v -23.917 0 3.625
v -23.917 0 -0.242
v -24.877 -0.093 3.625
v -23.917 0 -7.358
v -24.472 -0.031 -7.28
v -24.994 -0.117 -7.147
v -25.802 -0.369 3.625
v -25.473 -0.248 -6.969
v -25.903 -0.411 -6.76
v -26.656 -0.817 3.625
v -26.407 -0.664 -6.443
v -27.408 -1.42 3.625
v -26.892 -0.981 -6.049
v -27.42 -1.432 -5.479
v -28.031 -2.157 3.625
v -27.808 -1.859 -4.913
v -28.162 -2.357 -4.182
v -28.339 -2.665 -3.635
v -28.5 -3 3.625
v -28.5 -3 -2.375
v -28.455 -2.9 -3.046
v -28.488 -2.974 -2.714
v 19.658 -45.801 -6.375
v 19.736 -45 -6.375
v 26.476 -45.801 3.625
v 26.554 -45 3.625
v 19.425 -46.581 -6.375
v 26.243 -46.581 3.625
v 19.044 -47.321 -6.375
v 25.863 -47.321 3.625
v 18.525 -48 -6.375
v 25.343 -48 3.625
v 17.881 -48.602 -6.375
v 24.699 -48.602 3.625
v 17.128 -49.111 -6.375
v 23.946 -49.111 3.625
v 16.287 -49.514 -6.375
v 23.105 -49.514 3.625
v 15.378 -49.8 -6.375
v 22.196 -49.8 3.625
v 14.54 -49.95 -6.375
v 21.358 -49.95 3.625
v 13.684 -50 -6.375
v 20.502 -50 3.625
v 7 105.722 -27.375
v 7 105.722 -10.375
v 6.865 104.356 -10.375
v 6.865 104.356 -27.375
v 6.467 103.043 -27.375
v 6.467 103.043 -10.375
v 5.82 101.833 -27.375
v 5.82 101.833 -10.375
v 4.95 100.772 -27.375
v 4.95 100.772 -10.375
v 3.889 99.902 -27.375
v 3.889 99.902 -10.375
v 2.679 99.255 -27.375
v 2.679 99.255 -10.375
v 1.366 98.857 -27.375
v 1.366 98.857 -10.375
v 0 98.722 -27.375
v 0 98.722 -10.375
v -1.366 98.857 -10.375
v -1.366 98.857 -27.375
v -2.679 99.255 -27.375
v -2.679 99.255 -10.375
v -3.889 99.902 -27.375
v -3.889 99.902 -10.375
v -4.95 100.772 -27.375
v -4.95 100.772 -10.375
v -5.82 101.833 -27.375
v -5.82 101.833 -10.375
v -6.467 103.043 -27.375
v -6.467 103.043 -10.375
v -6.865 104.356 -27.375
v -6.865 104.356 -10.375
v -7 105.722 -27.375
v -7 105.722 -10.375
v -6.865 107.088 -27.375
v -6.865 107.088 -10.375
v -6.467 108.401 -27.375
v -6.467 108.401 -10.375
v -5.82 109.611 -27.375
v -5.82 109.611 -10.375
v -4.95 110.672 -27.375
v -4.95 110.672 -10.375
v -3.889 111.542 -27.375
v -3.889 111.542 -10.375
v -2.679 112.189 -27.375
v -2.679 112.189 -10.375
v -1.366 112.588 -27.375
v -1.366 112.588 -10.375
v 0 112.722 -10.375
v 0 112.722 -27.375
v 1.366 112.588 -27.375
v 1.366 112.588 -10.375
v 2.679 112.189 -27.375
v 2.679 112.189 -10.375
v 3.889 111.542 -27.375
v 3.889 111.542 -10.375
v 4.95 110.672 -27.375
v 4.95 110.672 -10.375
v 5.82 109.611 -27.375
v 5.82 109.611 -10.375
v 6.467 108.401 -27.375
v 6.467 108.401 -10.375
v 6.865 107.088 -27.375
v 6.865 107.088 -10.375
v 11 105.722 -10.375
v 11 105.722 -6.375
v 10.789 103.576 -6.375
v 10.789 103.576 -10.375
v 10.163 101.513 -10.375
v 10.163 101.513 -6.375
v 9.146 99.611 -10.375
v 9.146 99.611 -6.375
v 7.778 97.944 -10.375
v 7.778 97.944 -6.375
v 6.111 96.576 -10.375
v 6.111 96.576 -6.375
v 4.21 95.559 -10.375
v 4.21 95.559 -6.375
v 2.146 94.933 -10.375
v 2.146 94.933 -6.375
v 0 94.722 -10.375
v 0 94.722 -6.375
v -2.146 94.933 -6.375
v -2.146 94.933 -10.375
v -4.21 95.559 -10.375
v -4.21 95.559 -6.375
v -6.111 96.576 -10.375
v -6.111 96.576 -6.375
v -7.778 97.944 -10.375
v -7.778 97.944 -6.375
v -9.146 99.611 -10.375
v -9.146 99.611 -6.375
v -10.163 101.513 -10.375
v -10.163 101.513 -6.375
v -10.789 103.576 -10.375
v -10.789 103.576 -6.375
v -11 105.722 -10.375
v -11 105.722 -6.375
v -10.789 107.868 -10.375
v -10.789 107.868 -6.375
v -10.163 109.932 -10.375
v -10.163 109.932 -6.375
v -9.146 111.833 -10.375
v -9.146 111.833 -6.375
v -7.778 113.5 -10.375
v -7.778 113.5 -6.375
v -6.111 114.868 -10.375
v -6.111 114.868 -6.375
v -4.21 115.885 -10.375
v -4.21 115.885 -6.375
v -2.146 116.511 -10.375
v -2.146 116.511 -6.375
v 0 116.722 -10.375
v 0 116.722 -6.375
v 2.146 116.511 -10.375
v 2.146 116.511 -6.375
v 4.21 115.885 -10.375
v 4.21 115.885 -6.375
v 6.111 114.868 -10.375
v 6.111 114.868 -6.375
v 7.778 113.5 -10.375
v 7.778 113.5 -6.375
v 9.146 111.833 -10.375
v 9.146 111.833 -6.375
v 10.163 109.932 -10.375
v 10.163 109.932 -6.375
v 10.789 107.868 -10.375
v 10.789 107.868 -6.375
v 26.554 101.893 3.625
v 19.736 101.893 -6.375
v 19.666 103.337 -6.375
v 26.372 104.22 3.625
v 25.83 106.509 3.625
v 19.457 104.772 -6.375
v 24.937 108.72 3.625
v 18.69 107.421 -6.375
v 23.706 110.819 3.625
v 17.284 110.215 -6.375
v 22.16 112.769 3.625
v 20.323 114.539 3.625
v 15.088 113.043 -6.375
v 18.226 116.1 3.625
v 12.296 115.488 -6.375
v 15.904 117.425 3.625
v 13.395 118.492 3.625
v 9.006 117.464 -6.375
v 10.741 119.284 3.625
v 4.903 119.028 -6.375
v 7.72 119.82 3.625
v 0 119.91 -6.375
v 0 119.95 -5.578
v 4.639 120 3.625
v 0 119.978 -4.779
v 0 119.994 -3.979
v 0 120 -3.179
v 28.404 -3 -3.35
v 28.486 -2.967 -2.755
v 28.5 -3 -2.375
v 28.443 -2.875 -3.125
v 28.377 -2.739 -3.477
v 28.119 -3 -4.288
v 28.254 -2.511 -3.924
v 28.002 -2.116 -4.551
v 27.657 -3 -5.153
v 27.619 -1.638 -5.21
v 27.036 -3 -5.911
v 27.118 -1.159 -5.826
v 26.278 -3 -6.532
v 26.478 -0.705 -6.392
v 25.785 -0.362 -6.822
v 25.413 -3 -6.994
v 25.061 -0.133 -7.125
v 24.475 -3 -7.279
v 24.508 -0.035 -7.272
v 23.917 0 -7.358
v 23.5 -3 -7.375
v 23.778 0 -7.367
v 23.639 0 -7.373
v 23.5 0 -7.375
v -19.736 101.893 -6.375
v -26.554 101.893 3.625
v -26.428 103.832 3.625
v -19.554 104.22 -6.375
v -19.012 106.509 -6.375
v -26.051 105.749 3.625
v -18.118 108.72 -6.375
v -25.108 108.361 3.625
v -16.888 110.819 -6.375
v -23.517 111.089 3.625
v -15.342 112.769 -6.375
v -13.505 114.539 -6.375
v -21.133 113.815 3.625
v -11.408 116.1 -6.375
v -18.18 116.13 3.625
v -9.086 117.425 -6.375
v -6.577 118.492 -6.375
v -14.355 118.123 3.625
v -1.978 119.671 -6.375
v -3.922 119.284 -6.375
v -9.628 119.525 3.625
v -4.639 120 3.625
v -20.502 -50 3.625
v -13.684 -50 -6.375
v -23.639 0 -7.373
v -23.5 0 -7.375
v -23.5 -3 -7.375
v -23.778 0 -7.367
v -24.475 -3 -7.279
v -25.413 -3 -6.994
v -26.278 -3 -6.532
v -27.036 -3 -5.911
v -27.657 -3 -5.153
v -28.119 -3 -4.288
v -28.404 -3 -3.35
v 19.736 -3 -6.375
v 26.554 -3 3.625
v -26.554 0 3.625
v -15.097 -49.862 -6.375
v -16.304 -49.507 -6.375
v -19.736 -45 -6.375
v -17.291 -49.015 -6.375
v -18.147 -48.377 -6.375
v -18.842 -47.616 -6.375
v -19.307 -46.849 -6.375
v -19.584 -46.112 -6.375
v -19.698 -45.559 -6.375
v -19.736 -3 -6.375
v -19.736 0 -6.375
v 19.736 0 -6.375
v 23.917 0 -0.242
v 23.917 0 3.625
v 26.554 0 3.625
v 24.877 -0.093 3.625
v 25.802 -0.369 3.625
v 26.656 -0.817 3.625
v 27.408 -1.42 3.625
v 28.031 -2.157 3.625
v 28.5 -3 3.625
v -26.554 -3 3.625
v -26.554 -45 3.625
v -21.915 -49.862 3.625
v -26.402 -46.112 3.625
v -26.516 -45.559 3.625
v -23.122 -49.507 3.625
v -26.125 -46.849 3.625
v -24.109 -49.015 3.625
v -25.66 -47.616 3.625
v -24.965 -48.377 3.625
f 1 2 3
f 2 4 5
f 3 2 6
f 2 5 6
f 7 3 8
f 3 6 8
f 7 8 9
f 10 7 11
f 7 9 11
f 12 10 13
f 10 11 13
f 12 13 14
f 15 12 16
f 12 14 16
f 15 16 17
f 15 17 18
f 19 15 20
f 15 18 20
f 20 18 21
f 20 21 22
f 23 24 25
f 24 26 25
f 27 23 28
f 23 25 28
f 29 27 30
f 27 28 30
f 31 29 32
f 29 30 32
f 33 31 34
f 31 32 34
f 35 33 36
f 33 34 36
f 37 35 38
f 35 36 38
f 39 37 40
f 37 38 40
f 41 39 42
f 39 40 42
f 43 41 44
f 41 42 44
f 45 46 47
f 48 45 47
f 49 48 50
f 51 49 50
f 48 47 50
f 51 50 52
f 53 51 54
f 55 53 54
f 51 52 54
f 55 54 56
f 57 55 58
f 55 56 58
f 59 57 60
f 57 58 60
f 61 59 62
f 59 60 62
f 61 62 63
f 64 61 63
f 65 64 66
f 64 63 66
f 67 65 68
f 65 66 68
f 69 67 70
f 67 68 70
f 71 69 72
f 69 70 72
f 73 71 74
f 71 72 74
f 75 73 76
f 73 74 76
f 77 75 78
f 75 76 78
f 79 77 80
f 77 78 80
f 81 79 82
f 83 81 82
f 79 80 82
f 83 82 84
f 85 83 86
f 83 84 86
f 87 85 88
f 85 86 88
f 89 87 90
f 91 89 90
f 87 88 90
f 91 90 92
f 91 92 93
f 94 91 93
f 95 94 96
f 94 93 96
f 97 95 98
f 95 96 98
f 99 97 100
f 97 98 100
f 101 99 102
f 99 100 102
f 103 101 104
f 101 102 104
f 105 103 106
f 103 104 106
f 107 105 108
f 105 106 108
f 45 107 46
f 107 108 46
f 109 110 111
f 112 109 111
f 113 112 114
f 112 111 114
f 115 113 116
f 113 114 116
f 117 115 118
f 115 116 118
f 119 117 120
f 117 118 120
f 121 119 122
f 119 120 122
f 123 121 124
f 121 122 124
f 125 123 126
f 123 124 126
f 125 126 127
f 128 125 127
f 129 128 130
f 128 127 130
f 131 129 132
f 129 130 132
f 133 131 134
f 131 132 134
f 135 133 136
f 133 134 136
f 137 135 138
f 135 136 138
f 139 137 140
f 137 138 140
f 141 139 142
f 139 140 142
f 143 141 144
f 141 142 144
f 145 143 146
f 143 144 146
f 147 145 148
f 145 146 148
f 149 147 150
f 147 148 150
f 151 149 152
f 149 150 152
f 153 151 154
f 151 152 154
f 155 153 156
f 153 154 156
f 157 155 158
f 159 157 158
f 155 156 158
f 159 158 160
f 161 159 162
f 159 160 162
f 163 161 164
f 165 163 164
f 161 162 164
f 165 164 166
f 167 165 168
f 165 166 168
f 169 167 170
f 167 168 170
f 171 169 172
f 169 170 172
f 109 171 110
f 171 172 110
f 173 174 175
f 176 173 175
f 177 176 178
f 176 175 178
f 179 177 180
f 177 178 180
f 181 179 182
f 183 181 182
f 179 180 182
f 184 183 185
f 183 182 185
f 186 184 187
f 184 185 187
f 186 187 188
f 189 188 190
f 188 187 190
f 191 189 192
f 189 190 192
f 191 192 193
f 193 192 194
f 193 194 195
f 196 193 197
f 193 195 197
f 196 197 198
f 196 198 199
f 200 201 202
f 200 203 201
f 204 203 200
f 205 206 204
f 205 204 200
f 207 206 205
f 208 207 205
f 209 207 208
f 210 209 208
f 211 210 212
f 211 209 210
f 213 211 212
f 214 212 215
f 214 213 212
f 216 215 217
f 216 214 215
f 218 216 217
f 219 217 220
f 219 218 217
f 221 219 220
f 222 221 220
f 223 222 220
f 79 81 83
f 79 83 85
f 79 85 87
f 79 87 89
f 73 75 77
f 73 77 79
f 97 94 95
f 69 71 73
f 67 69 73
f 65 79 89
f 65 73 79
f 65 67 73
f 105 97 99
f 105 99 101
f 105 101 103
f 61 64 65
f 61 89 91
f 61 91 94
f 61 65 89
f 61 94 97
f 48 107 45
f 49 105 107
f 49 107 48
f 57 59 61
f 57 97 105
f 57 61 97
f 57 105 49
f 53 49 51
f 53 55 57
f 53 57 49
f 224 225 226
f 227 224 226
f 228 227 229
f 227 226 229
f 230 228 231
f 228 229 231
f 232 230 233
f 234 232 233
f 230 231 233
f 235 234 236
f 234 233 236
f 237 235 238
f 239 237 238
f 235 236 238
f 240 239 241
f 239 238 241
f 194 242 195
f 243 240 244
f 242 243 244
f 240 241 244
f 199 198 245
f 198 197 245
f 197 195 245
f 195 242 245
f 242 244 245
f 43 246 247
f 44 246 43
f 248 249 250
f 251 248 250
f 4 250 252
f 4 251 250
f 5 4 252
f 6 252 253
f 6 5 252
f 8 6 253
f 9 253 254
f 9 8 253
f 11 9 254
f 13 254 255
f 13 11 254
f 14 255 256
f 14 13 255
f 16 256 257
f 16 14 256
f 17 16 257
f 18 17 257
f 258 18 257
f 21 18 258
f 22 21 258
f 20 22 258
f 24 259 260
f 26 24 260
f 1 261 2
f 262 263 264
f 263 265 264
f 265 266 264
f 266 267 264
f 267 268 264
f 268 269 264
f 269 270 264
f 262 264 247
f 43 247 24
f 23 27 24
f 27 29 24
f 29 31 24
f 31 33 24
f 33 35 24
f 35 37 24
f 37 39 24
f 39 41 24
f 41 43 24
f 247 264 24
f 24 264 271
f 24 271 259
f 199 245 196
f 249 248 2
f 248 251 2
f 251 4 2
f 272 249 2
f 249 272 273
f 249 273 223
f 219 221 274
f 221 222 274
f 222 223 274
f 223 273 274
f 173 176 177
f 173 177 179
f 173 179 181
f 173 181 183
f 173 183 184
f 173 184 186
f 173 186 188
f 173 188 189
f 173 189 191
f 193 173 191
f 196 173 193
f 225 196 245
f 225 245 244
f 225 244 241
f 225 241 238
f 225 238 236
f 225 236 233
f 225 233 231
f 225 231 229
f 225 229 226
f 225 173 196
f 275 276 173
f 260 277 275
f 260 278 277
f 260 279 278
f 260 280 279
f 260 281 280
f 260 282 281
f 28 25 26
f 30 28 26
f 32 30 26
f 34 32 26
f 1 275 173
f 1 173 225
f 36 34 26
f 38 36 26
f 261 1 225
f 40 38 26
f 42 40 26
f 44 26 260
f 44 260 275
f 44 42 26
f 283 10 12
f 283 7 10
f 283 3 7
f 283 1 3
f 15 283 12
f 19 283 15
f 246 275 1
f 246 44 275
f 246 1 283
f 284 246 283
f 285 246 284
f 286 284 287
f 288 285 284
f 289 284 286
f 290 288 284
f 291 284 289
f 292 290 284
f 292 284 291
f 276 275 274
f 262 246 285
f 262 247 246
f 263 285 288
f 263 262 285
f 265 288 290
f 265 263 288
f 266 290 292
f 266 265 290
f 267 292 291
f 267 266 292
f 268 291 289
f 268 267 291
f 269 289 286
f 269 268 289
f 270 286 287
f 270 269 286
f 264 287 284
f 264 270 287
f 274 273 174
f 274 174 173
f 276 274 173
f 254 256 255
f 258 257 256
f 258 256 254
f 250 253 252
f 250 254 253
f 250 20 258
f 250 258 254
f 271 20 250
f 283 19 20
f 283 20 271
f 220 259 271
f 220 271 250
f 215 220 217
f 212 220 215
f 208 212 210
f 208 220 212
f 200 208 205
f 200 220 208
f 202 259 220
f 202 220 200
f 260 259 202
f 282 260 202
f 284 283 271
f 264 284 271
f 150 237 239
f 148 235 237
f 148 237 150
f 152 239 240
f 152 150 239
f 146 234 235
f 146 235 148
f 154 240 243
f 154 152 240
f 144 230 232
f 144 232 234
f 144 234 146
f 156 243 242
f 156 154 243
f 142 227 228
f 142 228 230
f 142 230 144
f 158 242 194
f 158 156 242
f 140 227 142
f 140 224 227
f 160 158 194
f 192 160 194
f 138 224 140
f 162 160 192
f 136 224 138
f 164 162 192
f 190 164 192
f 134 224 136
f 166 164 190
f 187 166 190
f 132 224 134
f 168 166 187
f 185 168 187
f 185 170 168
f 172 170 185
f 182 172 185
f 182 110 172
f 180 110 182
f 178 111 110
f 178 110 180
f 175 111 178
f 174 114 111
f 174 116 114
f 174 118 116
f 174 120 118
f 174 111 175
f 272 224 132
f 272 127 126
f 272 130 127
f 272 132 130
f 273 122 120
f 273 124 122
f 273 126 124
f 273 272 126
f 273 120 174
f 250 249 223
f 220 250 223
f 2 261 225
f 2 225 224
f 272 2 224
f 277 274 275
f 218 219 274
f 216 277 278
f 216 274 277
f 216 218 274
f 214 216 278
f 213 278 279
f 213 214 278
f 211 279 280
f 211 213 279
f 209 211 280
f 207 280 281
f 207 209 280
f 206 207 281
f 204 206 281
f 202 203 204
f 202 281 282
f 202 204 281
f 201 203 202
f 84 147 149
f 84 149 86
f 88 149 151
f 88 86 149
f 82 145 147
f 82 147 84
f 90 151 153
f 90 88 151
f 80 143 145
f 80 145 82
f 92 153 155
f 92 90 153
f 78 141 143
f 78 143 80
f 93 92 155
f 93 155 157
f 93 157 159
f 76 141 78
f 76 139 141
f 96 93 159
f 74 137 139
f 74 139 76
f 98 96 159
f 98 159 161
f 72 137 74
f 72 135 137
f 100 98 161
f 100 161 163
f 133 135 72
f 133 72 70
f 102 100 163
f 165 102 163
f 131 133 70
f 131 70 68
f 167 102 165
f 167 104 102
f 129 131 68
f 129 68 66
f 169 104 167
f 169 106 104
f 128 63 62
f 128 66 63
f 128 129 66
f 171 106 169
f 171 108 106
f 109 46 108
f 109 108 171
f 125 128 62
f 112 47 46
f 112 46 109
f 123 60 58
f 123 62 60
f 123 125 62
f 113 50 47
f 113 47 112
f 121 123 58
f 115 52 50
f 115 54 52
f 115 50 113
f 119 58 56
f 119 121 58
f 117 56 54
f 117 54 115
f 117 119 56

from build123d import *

# Parameters (mm, degrees)
F1_DEPTH    = 50
F2_DEPTH    = 3
F3_T1_DEPTH = 28
F3_T3_DEPTH = 33.9128784748
F4_DEPTH    = 120
F5_T1_DEPTH = 102.6362149123
F5_T3_DEPTH = 102.6362149123
F6_R        = 11
F7_DEPTH    = 4
F8_R        = 7
F9_DEPTH    = 17
F10_R       = 5


# Not quite as in the source:
# - a fillet or chamfer that OpenCascade refuses, or shapes differently, is made with other operations: its cross-section is extruded or revolved along the edge and cut away or added


with BuildPart() as f1:
    # F0 (on Front) → F1 (new body)
    with BuildSketch(Plane.XZ):
        Polygon((26.5539305929, 3.625), (-26.5539305929, 3.625), (-19.7357487747, -6.375), (19.7357487747, -6.375), align=None)
    extrude(amount=F1_DEPTH)

    # F0 (on Front) → F2 (join)
    with BuildSketch(Plane.XZ):
        Polygon((20, -6.875), (-20, -6.875), (-27.1590909091, 3.625), (-27.5, 3.625), (-28.5, 3.625), (-28.5, -7.375), (28.5, -7.375), (28.5, 3.625), (27.5, 3.625), (27.1590909091, 3.625), align=None)
        Polygon((26.5539305929, 3.625), (-26.5539305929, 3.625), (-19.7357487747, -6.375), (19.7357487747, -6.375), align=None)
        Polygon((-27.1590909091, 3.625), (-20, -6.875), (20, -6.875), (27.1590909091, 3.625), (26.5539305929, 3.625), (19.7357487747, -6.375), (-19.7357487747, -6.375), (-26.5539305929, 3.625), align=None)
    extrude(amount=F2_DEPTH)

    # F3: fillet of radius 5 on 4 edges, made by hand

    # F3_s2 → F3_t1 (cut)
    with BuildSketch(Plane.XZ.offset(-12.5)):
        with BuildLine():
            ThreePointArc((28.5, -2.375), (27.0355339059, -5.9105339059), (23.5, -7.375))
            Line((23.5, -7.375), (28.5, -7.375))
            Line((28.5, -7.375), (28.5, -2.375))
        make_face()
        with BuildLine():
            ThreePointArc((-23.5, -7.375), (-27.0355339059, -5.9105339059), (-28.5, -2.375))
            Line((-28.5, -2.375), (-28.5, -7.375))
            Line((-28.5, -7.375), (-23.5, -7.375))
        make_face()
    extrude(amount=F3_T1_DEPTH, mode=Mode.SUBTRACT)

    # F3_s4 → F3_t3 (cut)
    with BuildSketch(Plane.XY.offset(-18.8314392374)):
        with BuildLine():
            ThreePointArc((23.917424305, 0), (26.6560370926, -0.8166998673), (28.5, -3))
            Line((28.5, -3), (28.5, 0))
            Line((28.5, 0), (23.917424305, 0))
        make_face()
        with BuildLine():
            ThreePointArc((-23.917424305, 0), (-26.6560370926, -0.8166998673), (-28.5, -3))
            Line((-28.5, -3), (-28.5, 0))
            Line((-28.5, 0), (-23.917424305, 0))
        make_face()
    extrude(amount=F3_T3_DEPTH, mode=Mode.SUBTRACT)

    # F0 (on Front) → F4 (join)
    with BuildSketch(Plane.XZ):
        Polygon((26.5539305929, 3.625), (-26.5539305929, 3.625), (-19.7357487747, -6.375), (19.7357487747, -6.375), align=None)
    extrude(amount=-F4_DEPTH)

    # F5: fillet of radius 18.1066017178 on 2 edges, made by hand

    # F5_s2 → F5_t1 (cut)
    with BuildSketch(Plane(origin=(-22.2043882639, 0, -32.5664361204), x_dir=(0, 1, 0), z_dir=(0.5633368246, 0, 0.8262273428))):
        with BuildLine():
            ThreePointArc((101.8933982822, -19.8974875256), (114.6966991411, -14.5941866667), (120, -1.7908858078))
            Line((120, -1.7908858078), (120, -19.8974875256))
            Line((120, -19.8974875256), (101.8933982822, -19.8974875256))
        make_face()
    extrude(amount=F5_T1_DEPTH, mode=Mode.SUBTRACT)

    # F5_s4 → F5_t3 (cut)
    with BuildSketch(Plane(origin=(-35.614371138, 0, 52.2344110024), x_dir=(0, 1, 0), z_dir=(0.5633368246, 0, -0.8262273428))):
        with BuildLine():
            ThreePointArc((101.8933982822, -19.8974875256), (114.6966991411, -14.5941866667), (120, -1.7908858078))
            Line((120, -1.7908858078), (120, -19.8974875256))
            Line((120, -19.8974875256), (101.8933982822, -19.8974875256))
        make_face()
    extrude(amount=F5_T3_DEPTH, mode=Mode.SUBTRACT)

    # F6 (on face) → F7 (join)
    with BuildSketch(Plane(origin=(0, 0, -6.375), x_dir=(1, 0, 0), z_dir=(0, 0, -1))):
        with Locations((0, -105.7220622897)):
            Circle(F6_R)
    extrude(amount=F7_DEPTH)

    # F8 (on face) → F9 (join)
    with BuildSketch(Plane(origin=(0, 0, -10.375), x_dir=(1, 0, 0), z_dir=(0, 0, -1))):
        with Locations((0, -105.7220622897)):
            Circle(F8_R)
    extrude(amount=F9_DEPTH)

    # F10
    f10_edges = [f1.edges().sort_by_distance(p)[0] for p in [
        (23.14484, -50, -1.375),
        (-23.14484, -50, -1.375),
    ]]
    fillet(f10_edges, radius=F10_R)


solid = f1.part
